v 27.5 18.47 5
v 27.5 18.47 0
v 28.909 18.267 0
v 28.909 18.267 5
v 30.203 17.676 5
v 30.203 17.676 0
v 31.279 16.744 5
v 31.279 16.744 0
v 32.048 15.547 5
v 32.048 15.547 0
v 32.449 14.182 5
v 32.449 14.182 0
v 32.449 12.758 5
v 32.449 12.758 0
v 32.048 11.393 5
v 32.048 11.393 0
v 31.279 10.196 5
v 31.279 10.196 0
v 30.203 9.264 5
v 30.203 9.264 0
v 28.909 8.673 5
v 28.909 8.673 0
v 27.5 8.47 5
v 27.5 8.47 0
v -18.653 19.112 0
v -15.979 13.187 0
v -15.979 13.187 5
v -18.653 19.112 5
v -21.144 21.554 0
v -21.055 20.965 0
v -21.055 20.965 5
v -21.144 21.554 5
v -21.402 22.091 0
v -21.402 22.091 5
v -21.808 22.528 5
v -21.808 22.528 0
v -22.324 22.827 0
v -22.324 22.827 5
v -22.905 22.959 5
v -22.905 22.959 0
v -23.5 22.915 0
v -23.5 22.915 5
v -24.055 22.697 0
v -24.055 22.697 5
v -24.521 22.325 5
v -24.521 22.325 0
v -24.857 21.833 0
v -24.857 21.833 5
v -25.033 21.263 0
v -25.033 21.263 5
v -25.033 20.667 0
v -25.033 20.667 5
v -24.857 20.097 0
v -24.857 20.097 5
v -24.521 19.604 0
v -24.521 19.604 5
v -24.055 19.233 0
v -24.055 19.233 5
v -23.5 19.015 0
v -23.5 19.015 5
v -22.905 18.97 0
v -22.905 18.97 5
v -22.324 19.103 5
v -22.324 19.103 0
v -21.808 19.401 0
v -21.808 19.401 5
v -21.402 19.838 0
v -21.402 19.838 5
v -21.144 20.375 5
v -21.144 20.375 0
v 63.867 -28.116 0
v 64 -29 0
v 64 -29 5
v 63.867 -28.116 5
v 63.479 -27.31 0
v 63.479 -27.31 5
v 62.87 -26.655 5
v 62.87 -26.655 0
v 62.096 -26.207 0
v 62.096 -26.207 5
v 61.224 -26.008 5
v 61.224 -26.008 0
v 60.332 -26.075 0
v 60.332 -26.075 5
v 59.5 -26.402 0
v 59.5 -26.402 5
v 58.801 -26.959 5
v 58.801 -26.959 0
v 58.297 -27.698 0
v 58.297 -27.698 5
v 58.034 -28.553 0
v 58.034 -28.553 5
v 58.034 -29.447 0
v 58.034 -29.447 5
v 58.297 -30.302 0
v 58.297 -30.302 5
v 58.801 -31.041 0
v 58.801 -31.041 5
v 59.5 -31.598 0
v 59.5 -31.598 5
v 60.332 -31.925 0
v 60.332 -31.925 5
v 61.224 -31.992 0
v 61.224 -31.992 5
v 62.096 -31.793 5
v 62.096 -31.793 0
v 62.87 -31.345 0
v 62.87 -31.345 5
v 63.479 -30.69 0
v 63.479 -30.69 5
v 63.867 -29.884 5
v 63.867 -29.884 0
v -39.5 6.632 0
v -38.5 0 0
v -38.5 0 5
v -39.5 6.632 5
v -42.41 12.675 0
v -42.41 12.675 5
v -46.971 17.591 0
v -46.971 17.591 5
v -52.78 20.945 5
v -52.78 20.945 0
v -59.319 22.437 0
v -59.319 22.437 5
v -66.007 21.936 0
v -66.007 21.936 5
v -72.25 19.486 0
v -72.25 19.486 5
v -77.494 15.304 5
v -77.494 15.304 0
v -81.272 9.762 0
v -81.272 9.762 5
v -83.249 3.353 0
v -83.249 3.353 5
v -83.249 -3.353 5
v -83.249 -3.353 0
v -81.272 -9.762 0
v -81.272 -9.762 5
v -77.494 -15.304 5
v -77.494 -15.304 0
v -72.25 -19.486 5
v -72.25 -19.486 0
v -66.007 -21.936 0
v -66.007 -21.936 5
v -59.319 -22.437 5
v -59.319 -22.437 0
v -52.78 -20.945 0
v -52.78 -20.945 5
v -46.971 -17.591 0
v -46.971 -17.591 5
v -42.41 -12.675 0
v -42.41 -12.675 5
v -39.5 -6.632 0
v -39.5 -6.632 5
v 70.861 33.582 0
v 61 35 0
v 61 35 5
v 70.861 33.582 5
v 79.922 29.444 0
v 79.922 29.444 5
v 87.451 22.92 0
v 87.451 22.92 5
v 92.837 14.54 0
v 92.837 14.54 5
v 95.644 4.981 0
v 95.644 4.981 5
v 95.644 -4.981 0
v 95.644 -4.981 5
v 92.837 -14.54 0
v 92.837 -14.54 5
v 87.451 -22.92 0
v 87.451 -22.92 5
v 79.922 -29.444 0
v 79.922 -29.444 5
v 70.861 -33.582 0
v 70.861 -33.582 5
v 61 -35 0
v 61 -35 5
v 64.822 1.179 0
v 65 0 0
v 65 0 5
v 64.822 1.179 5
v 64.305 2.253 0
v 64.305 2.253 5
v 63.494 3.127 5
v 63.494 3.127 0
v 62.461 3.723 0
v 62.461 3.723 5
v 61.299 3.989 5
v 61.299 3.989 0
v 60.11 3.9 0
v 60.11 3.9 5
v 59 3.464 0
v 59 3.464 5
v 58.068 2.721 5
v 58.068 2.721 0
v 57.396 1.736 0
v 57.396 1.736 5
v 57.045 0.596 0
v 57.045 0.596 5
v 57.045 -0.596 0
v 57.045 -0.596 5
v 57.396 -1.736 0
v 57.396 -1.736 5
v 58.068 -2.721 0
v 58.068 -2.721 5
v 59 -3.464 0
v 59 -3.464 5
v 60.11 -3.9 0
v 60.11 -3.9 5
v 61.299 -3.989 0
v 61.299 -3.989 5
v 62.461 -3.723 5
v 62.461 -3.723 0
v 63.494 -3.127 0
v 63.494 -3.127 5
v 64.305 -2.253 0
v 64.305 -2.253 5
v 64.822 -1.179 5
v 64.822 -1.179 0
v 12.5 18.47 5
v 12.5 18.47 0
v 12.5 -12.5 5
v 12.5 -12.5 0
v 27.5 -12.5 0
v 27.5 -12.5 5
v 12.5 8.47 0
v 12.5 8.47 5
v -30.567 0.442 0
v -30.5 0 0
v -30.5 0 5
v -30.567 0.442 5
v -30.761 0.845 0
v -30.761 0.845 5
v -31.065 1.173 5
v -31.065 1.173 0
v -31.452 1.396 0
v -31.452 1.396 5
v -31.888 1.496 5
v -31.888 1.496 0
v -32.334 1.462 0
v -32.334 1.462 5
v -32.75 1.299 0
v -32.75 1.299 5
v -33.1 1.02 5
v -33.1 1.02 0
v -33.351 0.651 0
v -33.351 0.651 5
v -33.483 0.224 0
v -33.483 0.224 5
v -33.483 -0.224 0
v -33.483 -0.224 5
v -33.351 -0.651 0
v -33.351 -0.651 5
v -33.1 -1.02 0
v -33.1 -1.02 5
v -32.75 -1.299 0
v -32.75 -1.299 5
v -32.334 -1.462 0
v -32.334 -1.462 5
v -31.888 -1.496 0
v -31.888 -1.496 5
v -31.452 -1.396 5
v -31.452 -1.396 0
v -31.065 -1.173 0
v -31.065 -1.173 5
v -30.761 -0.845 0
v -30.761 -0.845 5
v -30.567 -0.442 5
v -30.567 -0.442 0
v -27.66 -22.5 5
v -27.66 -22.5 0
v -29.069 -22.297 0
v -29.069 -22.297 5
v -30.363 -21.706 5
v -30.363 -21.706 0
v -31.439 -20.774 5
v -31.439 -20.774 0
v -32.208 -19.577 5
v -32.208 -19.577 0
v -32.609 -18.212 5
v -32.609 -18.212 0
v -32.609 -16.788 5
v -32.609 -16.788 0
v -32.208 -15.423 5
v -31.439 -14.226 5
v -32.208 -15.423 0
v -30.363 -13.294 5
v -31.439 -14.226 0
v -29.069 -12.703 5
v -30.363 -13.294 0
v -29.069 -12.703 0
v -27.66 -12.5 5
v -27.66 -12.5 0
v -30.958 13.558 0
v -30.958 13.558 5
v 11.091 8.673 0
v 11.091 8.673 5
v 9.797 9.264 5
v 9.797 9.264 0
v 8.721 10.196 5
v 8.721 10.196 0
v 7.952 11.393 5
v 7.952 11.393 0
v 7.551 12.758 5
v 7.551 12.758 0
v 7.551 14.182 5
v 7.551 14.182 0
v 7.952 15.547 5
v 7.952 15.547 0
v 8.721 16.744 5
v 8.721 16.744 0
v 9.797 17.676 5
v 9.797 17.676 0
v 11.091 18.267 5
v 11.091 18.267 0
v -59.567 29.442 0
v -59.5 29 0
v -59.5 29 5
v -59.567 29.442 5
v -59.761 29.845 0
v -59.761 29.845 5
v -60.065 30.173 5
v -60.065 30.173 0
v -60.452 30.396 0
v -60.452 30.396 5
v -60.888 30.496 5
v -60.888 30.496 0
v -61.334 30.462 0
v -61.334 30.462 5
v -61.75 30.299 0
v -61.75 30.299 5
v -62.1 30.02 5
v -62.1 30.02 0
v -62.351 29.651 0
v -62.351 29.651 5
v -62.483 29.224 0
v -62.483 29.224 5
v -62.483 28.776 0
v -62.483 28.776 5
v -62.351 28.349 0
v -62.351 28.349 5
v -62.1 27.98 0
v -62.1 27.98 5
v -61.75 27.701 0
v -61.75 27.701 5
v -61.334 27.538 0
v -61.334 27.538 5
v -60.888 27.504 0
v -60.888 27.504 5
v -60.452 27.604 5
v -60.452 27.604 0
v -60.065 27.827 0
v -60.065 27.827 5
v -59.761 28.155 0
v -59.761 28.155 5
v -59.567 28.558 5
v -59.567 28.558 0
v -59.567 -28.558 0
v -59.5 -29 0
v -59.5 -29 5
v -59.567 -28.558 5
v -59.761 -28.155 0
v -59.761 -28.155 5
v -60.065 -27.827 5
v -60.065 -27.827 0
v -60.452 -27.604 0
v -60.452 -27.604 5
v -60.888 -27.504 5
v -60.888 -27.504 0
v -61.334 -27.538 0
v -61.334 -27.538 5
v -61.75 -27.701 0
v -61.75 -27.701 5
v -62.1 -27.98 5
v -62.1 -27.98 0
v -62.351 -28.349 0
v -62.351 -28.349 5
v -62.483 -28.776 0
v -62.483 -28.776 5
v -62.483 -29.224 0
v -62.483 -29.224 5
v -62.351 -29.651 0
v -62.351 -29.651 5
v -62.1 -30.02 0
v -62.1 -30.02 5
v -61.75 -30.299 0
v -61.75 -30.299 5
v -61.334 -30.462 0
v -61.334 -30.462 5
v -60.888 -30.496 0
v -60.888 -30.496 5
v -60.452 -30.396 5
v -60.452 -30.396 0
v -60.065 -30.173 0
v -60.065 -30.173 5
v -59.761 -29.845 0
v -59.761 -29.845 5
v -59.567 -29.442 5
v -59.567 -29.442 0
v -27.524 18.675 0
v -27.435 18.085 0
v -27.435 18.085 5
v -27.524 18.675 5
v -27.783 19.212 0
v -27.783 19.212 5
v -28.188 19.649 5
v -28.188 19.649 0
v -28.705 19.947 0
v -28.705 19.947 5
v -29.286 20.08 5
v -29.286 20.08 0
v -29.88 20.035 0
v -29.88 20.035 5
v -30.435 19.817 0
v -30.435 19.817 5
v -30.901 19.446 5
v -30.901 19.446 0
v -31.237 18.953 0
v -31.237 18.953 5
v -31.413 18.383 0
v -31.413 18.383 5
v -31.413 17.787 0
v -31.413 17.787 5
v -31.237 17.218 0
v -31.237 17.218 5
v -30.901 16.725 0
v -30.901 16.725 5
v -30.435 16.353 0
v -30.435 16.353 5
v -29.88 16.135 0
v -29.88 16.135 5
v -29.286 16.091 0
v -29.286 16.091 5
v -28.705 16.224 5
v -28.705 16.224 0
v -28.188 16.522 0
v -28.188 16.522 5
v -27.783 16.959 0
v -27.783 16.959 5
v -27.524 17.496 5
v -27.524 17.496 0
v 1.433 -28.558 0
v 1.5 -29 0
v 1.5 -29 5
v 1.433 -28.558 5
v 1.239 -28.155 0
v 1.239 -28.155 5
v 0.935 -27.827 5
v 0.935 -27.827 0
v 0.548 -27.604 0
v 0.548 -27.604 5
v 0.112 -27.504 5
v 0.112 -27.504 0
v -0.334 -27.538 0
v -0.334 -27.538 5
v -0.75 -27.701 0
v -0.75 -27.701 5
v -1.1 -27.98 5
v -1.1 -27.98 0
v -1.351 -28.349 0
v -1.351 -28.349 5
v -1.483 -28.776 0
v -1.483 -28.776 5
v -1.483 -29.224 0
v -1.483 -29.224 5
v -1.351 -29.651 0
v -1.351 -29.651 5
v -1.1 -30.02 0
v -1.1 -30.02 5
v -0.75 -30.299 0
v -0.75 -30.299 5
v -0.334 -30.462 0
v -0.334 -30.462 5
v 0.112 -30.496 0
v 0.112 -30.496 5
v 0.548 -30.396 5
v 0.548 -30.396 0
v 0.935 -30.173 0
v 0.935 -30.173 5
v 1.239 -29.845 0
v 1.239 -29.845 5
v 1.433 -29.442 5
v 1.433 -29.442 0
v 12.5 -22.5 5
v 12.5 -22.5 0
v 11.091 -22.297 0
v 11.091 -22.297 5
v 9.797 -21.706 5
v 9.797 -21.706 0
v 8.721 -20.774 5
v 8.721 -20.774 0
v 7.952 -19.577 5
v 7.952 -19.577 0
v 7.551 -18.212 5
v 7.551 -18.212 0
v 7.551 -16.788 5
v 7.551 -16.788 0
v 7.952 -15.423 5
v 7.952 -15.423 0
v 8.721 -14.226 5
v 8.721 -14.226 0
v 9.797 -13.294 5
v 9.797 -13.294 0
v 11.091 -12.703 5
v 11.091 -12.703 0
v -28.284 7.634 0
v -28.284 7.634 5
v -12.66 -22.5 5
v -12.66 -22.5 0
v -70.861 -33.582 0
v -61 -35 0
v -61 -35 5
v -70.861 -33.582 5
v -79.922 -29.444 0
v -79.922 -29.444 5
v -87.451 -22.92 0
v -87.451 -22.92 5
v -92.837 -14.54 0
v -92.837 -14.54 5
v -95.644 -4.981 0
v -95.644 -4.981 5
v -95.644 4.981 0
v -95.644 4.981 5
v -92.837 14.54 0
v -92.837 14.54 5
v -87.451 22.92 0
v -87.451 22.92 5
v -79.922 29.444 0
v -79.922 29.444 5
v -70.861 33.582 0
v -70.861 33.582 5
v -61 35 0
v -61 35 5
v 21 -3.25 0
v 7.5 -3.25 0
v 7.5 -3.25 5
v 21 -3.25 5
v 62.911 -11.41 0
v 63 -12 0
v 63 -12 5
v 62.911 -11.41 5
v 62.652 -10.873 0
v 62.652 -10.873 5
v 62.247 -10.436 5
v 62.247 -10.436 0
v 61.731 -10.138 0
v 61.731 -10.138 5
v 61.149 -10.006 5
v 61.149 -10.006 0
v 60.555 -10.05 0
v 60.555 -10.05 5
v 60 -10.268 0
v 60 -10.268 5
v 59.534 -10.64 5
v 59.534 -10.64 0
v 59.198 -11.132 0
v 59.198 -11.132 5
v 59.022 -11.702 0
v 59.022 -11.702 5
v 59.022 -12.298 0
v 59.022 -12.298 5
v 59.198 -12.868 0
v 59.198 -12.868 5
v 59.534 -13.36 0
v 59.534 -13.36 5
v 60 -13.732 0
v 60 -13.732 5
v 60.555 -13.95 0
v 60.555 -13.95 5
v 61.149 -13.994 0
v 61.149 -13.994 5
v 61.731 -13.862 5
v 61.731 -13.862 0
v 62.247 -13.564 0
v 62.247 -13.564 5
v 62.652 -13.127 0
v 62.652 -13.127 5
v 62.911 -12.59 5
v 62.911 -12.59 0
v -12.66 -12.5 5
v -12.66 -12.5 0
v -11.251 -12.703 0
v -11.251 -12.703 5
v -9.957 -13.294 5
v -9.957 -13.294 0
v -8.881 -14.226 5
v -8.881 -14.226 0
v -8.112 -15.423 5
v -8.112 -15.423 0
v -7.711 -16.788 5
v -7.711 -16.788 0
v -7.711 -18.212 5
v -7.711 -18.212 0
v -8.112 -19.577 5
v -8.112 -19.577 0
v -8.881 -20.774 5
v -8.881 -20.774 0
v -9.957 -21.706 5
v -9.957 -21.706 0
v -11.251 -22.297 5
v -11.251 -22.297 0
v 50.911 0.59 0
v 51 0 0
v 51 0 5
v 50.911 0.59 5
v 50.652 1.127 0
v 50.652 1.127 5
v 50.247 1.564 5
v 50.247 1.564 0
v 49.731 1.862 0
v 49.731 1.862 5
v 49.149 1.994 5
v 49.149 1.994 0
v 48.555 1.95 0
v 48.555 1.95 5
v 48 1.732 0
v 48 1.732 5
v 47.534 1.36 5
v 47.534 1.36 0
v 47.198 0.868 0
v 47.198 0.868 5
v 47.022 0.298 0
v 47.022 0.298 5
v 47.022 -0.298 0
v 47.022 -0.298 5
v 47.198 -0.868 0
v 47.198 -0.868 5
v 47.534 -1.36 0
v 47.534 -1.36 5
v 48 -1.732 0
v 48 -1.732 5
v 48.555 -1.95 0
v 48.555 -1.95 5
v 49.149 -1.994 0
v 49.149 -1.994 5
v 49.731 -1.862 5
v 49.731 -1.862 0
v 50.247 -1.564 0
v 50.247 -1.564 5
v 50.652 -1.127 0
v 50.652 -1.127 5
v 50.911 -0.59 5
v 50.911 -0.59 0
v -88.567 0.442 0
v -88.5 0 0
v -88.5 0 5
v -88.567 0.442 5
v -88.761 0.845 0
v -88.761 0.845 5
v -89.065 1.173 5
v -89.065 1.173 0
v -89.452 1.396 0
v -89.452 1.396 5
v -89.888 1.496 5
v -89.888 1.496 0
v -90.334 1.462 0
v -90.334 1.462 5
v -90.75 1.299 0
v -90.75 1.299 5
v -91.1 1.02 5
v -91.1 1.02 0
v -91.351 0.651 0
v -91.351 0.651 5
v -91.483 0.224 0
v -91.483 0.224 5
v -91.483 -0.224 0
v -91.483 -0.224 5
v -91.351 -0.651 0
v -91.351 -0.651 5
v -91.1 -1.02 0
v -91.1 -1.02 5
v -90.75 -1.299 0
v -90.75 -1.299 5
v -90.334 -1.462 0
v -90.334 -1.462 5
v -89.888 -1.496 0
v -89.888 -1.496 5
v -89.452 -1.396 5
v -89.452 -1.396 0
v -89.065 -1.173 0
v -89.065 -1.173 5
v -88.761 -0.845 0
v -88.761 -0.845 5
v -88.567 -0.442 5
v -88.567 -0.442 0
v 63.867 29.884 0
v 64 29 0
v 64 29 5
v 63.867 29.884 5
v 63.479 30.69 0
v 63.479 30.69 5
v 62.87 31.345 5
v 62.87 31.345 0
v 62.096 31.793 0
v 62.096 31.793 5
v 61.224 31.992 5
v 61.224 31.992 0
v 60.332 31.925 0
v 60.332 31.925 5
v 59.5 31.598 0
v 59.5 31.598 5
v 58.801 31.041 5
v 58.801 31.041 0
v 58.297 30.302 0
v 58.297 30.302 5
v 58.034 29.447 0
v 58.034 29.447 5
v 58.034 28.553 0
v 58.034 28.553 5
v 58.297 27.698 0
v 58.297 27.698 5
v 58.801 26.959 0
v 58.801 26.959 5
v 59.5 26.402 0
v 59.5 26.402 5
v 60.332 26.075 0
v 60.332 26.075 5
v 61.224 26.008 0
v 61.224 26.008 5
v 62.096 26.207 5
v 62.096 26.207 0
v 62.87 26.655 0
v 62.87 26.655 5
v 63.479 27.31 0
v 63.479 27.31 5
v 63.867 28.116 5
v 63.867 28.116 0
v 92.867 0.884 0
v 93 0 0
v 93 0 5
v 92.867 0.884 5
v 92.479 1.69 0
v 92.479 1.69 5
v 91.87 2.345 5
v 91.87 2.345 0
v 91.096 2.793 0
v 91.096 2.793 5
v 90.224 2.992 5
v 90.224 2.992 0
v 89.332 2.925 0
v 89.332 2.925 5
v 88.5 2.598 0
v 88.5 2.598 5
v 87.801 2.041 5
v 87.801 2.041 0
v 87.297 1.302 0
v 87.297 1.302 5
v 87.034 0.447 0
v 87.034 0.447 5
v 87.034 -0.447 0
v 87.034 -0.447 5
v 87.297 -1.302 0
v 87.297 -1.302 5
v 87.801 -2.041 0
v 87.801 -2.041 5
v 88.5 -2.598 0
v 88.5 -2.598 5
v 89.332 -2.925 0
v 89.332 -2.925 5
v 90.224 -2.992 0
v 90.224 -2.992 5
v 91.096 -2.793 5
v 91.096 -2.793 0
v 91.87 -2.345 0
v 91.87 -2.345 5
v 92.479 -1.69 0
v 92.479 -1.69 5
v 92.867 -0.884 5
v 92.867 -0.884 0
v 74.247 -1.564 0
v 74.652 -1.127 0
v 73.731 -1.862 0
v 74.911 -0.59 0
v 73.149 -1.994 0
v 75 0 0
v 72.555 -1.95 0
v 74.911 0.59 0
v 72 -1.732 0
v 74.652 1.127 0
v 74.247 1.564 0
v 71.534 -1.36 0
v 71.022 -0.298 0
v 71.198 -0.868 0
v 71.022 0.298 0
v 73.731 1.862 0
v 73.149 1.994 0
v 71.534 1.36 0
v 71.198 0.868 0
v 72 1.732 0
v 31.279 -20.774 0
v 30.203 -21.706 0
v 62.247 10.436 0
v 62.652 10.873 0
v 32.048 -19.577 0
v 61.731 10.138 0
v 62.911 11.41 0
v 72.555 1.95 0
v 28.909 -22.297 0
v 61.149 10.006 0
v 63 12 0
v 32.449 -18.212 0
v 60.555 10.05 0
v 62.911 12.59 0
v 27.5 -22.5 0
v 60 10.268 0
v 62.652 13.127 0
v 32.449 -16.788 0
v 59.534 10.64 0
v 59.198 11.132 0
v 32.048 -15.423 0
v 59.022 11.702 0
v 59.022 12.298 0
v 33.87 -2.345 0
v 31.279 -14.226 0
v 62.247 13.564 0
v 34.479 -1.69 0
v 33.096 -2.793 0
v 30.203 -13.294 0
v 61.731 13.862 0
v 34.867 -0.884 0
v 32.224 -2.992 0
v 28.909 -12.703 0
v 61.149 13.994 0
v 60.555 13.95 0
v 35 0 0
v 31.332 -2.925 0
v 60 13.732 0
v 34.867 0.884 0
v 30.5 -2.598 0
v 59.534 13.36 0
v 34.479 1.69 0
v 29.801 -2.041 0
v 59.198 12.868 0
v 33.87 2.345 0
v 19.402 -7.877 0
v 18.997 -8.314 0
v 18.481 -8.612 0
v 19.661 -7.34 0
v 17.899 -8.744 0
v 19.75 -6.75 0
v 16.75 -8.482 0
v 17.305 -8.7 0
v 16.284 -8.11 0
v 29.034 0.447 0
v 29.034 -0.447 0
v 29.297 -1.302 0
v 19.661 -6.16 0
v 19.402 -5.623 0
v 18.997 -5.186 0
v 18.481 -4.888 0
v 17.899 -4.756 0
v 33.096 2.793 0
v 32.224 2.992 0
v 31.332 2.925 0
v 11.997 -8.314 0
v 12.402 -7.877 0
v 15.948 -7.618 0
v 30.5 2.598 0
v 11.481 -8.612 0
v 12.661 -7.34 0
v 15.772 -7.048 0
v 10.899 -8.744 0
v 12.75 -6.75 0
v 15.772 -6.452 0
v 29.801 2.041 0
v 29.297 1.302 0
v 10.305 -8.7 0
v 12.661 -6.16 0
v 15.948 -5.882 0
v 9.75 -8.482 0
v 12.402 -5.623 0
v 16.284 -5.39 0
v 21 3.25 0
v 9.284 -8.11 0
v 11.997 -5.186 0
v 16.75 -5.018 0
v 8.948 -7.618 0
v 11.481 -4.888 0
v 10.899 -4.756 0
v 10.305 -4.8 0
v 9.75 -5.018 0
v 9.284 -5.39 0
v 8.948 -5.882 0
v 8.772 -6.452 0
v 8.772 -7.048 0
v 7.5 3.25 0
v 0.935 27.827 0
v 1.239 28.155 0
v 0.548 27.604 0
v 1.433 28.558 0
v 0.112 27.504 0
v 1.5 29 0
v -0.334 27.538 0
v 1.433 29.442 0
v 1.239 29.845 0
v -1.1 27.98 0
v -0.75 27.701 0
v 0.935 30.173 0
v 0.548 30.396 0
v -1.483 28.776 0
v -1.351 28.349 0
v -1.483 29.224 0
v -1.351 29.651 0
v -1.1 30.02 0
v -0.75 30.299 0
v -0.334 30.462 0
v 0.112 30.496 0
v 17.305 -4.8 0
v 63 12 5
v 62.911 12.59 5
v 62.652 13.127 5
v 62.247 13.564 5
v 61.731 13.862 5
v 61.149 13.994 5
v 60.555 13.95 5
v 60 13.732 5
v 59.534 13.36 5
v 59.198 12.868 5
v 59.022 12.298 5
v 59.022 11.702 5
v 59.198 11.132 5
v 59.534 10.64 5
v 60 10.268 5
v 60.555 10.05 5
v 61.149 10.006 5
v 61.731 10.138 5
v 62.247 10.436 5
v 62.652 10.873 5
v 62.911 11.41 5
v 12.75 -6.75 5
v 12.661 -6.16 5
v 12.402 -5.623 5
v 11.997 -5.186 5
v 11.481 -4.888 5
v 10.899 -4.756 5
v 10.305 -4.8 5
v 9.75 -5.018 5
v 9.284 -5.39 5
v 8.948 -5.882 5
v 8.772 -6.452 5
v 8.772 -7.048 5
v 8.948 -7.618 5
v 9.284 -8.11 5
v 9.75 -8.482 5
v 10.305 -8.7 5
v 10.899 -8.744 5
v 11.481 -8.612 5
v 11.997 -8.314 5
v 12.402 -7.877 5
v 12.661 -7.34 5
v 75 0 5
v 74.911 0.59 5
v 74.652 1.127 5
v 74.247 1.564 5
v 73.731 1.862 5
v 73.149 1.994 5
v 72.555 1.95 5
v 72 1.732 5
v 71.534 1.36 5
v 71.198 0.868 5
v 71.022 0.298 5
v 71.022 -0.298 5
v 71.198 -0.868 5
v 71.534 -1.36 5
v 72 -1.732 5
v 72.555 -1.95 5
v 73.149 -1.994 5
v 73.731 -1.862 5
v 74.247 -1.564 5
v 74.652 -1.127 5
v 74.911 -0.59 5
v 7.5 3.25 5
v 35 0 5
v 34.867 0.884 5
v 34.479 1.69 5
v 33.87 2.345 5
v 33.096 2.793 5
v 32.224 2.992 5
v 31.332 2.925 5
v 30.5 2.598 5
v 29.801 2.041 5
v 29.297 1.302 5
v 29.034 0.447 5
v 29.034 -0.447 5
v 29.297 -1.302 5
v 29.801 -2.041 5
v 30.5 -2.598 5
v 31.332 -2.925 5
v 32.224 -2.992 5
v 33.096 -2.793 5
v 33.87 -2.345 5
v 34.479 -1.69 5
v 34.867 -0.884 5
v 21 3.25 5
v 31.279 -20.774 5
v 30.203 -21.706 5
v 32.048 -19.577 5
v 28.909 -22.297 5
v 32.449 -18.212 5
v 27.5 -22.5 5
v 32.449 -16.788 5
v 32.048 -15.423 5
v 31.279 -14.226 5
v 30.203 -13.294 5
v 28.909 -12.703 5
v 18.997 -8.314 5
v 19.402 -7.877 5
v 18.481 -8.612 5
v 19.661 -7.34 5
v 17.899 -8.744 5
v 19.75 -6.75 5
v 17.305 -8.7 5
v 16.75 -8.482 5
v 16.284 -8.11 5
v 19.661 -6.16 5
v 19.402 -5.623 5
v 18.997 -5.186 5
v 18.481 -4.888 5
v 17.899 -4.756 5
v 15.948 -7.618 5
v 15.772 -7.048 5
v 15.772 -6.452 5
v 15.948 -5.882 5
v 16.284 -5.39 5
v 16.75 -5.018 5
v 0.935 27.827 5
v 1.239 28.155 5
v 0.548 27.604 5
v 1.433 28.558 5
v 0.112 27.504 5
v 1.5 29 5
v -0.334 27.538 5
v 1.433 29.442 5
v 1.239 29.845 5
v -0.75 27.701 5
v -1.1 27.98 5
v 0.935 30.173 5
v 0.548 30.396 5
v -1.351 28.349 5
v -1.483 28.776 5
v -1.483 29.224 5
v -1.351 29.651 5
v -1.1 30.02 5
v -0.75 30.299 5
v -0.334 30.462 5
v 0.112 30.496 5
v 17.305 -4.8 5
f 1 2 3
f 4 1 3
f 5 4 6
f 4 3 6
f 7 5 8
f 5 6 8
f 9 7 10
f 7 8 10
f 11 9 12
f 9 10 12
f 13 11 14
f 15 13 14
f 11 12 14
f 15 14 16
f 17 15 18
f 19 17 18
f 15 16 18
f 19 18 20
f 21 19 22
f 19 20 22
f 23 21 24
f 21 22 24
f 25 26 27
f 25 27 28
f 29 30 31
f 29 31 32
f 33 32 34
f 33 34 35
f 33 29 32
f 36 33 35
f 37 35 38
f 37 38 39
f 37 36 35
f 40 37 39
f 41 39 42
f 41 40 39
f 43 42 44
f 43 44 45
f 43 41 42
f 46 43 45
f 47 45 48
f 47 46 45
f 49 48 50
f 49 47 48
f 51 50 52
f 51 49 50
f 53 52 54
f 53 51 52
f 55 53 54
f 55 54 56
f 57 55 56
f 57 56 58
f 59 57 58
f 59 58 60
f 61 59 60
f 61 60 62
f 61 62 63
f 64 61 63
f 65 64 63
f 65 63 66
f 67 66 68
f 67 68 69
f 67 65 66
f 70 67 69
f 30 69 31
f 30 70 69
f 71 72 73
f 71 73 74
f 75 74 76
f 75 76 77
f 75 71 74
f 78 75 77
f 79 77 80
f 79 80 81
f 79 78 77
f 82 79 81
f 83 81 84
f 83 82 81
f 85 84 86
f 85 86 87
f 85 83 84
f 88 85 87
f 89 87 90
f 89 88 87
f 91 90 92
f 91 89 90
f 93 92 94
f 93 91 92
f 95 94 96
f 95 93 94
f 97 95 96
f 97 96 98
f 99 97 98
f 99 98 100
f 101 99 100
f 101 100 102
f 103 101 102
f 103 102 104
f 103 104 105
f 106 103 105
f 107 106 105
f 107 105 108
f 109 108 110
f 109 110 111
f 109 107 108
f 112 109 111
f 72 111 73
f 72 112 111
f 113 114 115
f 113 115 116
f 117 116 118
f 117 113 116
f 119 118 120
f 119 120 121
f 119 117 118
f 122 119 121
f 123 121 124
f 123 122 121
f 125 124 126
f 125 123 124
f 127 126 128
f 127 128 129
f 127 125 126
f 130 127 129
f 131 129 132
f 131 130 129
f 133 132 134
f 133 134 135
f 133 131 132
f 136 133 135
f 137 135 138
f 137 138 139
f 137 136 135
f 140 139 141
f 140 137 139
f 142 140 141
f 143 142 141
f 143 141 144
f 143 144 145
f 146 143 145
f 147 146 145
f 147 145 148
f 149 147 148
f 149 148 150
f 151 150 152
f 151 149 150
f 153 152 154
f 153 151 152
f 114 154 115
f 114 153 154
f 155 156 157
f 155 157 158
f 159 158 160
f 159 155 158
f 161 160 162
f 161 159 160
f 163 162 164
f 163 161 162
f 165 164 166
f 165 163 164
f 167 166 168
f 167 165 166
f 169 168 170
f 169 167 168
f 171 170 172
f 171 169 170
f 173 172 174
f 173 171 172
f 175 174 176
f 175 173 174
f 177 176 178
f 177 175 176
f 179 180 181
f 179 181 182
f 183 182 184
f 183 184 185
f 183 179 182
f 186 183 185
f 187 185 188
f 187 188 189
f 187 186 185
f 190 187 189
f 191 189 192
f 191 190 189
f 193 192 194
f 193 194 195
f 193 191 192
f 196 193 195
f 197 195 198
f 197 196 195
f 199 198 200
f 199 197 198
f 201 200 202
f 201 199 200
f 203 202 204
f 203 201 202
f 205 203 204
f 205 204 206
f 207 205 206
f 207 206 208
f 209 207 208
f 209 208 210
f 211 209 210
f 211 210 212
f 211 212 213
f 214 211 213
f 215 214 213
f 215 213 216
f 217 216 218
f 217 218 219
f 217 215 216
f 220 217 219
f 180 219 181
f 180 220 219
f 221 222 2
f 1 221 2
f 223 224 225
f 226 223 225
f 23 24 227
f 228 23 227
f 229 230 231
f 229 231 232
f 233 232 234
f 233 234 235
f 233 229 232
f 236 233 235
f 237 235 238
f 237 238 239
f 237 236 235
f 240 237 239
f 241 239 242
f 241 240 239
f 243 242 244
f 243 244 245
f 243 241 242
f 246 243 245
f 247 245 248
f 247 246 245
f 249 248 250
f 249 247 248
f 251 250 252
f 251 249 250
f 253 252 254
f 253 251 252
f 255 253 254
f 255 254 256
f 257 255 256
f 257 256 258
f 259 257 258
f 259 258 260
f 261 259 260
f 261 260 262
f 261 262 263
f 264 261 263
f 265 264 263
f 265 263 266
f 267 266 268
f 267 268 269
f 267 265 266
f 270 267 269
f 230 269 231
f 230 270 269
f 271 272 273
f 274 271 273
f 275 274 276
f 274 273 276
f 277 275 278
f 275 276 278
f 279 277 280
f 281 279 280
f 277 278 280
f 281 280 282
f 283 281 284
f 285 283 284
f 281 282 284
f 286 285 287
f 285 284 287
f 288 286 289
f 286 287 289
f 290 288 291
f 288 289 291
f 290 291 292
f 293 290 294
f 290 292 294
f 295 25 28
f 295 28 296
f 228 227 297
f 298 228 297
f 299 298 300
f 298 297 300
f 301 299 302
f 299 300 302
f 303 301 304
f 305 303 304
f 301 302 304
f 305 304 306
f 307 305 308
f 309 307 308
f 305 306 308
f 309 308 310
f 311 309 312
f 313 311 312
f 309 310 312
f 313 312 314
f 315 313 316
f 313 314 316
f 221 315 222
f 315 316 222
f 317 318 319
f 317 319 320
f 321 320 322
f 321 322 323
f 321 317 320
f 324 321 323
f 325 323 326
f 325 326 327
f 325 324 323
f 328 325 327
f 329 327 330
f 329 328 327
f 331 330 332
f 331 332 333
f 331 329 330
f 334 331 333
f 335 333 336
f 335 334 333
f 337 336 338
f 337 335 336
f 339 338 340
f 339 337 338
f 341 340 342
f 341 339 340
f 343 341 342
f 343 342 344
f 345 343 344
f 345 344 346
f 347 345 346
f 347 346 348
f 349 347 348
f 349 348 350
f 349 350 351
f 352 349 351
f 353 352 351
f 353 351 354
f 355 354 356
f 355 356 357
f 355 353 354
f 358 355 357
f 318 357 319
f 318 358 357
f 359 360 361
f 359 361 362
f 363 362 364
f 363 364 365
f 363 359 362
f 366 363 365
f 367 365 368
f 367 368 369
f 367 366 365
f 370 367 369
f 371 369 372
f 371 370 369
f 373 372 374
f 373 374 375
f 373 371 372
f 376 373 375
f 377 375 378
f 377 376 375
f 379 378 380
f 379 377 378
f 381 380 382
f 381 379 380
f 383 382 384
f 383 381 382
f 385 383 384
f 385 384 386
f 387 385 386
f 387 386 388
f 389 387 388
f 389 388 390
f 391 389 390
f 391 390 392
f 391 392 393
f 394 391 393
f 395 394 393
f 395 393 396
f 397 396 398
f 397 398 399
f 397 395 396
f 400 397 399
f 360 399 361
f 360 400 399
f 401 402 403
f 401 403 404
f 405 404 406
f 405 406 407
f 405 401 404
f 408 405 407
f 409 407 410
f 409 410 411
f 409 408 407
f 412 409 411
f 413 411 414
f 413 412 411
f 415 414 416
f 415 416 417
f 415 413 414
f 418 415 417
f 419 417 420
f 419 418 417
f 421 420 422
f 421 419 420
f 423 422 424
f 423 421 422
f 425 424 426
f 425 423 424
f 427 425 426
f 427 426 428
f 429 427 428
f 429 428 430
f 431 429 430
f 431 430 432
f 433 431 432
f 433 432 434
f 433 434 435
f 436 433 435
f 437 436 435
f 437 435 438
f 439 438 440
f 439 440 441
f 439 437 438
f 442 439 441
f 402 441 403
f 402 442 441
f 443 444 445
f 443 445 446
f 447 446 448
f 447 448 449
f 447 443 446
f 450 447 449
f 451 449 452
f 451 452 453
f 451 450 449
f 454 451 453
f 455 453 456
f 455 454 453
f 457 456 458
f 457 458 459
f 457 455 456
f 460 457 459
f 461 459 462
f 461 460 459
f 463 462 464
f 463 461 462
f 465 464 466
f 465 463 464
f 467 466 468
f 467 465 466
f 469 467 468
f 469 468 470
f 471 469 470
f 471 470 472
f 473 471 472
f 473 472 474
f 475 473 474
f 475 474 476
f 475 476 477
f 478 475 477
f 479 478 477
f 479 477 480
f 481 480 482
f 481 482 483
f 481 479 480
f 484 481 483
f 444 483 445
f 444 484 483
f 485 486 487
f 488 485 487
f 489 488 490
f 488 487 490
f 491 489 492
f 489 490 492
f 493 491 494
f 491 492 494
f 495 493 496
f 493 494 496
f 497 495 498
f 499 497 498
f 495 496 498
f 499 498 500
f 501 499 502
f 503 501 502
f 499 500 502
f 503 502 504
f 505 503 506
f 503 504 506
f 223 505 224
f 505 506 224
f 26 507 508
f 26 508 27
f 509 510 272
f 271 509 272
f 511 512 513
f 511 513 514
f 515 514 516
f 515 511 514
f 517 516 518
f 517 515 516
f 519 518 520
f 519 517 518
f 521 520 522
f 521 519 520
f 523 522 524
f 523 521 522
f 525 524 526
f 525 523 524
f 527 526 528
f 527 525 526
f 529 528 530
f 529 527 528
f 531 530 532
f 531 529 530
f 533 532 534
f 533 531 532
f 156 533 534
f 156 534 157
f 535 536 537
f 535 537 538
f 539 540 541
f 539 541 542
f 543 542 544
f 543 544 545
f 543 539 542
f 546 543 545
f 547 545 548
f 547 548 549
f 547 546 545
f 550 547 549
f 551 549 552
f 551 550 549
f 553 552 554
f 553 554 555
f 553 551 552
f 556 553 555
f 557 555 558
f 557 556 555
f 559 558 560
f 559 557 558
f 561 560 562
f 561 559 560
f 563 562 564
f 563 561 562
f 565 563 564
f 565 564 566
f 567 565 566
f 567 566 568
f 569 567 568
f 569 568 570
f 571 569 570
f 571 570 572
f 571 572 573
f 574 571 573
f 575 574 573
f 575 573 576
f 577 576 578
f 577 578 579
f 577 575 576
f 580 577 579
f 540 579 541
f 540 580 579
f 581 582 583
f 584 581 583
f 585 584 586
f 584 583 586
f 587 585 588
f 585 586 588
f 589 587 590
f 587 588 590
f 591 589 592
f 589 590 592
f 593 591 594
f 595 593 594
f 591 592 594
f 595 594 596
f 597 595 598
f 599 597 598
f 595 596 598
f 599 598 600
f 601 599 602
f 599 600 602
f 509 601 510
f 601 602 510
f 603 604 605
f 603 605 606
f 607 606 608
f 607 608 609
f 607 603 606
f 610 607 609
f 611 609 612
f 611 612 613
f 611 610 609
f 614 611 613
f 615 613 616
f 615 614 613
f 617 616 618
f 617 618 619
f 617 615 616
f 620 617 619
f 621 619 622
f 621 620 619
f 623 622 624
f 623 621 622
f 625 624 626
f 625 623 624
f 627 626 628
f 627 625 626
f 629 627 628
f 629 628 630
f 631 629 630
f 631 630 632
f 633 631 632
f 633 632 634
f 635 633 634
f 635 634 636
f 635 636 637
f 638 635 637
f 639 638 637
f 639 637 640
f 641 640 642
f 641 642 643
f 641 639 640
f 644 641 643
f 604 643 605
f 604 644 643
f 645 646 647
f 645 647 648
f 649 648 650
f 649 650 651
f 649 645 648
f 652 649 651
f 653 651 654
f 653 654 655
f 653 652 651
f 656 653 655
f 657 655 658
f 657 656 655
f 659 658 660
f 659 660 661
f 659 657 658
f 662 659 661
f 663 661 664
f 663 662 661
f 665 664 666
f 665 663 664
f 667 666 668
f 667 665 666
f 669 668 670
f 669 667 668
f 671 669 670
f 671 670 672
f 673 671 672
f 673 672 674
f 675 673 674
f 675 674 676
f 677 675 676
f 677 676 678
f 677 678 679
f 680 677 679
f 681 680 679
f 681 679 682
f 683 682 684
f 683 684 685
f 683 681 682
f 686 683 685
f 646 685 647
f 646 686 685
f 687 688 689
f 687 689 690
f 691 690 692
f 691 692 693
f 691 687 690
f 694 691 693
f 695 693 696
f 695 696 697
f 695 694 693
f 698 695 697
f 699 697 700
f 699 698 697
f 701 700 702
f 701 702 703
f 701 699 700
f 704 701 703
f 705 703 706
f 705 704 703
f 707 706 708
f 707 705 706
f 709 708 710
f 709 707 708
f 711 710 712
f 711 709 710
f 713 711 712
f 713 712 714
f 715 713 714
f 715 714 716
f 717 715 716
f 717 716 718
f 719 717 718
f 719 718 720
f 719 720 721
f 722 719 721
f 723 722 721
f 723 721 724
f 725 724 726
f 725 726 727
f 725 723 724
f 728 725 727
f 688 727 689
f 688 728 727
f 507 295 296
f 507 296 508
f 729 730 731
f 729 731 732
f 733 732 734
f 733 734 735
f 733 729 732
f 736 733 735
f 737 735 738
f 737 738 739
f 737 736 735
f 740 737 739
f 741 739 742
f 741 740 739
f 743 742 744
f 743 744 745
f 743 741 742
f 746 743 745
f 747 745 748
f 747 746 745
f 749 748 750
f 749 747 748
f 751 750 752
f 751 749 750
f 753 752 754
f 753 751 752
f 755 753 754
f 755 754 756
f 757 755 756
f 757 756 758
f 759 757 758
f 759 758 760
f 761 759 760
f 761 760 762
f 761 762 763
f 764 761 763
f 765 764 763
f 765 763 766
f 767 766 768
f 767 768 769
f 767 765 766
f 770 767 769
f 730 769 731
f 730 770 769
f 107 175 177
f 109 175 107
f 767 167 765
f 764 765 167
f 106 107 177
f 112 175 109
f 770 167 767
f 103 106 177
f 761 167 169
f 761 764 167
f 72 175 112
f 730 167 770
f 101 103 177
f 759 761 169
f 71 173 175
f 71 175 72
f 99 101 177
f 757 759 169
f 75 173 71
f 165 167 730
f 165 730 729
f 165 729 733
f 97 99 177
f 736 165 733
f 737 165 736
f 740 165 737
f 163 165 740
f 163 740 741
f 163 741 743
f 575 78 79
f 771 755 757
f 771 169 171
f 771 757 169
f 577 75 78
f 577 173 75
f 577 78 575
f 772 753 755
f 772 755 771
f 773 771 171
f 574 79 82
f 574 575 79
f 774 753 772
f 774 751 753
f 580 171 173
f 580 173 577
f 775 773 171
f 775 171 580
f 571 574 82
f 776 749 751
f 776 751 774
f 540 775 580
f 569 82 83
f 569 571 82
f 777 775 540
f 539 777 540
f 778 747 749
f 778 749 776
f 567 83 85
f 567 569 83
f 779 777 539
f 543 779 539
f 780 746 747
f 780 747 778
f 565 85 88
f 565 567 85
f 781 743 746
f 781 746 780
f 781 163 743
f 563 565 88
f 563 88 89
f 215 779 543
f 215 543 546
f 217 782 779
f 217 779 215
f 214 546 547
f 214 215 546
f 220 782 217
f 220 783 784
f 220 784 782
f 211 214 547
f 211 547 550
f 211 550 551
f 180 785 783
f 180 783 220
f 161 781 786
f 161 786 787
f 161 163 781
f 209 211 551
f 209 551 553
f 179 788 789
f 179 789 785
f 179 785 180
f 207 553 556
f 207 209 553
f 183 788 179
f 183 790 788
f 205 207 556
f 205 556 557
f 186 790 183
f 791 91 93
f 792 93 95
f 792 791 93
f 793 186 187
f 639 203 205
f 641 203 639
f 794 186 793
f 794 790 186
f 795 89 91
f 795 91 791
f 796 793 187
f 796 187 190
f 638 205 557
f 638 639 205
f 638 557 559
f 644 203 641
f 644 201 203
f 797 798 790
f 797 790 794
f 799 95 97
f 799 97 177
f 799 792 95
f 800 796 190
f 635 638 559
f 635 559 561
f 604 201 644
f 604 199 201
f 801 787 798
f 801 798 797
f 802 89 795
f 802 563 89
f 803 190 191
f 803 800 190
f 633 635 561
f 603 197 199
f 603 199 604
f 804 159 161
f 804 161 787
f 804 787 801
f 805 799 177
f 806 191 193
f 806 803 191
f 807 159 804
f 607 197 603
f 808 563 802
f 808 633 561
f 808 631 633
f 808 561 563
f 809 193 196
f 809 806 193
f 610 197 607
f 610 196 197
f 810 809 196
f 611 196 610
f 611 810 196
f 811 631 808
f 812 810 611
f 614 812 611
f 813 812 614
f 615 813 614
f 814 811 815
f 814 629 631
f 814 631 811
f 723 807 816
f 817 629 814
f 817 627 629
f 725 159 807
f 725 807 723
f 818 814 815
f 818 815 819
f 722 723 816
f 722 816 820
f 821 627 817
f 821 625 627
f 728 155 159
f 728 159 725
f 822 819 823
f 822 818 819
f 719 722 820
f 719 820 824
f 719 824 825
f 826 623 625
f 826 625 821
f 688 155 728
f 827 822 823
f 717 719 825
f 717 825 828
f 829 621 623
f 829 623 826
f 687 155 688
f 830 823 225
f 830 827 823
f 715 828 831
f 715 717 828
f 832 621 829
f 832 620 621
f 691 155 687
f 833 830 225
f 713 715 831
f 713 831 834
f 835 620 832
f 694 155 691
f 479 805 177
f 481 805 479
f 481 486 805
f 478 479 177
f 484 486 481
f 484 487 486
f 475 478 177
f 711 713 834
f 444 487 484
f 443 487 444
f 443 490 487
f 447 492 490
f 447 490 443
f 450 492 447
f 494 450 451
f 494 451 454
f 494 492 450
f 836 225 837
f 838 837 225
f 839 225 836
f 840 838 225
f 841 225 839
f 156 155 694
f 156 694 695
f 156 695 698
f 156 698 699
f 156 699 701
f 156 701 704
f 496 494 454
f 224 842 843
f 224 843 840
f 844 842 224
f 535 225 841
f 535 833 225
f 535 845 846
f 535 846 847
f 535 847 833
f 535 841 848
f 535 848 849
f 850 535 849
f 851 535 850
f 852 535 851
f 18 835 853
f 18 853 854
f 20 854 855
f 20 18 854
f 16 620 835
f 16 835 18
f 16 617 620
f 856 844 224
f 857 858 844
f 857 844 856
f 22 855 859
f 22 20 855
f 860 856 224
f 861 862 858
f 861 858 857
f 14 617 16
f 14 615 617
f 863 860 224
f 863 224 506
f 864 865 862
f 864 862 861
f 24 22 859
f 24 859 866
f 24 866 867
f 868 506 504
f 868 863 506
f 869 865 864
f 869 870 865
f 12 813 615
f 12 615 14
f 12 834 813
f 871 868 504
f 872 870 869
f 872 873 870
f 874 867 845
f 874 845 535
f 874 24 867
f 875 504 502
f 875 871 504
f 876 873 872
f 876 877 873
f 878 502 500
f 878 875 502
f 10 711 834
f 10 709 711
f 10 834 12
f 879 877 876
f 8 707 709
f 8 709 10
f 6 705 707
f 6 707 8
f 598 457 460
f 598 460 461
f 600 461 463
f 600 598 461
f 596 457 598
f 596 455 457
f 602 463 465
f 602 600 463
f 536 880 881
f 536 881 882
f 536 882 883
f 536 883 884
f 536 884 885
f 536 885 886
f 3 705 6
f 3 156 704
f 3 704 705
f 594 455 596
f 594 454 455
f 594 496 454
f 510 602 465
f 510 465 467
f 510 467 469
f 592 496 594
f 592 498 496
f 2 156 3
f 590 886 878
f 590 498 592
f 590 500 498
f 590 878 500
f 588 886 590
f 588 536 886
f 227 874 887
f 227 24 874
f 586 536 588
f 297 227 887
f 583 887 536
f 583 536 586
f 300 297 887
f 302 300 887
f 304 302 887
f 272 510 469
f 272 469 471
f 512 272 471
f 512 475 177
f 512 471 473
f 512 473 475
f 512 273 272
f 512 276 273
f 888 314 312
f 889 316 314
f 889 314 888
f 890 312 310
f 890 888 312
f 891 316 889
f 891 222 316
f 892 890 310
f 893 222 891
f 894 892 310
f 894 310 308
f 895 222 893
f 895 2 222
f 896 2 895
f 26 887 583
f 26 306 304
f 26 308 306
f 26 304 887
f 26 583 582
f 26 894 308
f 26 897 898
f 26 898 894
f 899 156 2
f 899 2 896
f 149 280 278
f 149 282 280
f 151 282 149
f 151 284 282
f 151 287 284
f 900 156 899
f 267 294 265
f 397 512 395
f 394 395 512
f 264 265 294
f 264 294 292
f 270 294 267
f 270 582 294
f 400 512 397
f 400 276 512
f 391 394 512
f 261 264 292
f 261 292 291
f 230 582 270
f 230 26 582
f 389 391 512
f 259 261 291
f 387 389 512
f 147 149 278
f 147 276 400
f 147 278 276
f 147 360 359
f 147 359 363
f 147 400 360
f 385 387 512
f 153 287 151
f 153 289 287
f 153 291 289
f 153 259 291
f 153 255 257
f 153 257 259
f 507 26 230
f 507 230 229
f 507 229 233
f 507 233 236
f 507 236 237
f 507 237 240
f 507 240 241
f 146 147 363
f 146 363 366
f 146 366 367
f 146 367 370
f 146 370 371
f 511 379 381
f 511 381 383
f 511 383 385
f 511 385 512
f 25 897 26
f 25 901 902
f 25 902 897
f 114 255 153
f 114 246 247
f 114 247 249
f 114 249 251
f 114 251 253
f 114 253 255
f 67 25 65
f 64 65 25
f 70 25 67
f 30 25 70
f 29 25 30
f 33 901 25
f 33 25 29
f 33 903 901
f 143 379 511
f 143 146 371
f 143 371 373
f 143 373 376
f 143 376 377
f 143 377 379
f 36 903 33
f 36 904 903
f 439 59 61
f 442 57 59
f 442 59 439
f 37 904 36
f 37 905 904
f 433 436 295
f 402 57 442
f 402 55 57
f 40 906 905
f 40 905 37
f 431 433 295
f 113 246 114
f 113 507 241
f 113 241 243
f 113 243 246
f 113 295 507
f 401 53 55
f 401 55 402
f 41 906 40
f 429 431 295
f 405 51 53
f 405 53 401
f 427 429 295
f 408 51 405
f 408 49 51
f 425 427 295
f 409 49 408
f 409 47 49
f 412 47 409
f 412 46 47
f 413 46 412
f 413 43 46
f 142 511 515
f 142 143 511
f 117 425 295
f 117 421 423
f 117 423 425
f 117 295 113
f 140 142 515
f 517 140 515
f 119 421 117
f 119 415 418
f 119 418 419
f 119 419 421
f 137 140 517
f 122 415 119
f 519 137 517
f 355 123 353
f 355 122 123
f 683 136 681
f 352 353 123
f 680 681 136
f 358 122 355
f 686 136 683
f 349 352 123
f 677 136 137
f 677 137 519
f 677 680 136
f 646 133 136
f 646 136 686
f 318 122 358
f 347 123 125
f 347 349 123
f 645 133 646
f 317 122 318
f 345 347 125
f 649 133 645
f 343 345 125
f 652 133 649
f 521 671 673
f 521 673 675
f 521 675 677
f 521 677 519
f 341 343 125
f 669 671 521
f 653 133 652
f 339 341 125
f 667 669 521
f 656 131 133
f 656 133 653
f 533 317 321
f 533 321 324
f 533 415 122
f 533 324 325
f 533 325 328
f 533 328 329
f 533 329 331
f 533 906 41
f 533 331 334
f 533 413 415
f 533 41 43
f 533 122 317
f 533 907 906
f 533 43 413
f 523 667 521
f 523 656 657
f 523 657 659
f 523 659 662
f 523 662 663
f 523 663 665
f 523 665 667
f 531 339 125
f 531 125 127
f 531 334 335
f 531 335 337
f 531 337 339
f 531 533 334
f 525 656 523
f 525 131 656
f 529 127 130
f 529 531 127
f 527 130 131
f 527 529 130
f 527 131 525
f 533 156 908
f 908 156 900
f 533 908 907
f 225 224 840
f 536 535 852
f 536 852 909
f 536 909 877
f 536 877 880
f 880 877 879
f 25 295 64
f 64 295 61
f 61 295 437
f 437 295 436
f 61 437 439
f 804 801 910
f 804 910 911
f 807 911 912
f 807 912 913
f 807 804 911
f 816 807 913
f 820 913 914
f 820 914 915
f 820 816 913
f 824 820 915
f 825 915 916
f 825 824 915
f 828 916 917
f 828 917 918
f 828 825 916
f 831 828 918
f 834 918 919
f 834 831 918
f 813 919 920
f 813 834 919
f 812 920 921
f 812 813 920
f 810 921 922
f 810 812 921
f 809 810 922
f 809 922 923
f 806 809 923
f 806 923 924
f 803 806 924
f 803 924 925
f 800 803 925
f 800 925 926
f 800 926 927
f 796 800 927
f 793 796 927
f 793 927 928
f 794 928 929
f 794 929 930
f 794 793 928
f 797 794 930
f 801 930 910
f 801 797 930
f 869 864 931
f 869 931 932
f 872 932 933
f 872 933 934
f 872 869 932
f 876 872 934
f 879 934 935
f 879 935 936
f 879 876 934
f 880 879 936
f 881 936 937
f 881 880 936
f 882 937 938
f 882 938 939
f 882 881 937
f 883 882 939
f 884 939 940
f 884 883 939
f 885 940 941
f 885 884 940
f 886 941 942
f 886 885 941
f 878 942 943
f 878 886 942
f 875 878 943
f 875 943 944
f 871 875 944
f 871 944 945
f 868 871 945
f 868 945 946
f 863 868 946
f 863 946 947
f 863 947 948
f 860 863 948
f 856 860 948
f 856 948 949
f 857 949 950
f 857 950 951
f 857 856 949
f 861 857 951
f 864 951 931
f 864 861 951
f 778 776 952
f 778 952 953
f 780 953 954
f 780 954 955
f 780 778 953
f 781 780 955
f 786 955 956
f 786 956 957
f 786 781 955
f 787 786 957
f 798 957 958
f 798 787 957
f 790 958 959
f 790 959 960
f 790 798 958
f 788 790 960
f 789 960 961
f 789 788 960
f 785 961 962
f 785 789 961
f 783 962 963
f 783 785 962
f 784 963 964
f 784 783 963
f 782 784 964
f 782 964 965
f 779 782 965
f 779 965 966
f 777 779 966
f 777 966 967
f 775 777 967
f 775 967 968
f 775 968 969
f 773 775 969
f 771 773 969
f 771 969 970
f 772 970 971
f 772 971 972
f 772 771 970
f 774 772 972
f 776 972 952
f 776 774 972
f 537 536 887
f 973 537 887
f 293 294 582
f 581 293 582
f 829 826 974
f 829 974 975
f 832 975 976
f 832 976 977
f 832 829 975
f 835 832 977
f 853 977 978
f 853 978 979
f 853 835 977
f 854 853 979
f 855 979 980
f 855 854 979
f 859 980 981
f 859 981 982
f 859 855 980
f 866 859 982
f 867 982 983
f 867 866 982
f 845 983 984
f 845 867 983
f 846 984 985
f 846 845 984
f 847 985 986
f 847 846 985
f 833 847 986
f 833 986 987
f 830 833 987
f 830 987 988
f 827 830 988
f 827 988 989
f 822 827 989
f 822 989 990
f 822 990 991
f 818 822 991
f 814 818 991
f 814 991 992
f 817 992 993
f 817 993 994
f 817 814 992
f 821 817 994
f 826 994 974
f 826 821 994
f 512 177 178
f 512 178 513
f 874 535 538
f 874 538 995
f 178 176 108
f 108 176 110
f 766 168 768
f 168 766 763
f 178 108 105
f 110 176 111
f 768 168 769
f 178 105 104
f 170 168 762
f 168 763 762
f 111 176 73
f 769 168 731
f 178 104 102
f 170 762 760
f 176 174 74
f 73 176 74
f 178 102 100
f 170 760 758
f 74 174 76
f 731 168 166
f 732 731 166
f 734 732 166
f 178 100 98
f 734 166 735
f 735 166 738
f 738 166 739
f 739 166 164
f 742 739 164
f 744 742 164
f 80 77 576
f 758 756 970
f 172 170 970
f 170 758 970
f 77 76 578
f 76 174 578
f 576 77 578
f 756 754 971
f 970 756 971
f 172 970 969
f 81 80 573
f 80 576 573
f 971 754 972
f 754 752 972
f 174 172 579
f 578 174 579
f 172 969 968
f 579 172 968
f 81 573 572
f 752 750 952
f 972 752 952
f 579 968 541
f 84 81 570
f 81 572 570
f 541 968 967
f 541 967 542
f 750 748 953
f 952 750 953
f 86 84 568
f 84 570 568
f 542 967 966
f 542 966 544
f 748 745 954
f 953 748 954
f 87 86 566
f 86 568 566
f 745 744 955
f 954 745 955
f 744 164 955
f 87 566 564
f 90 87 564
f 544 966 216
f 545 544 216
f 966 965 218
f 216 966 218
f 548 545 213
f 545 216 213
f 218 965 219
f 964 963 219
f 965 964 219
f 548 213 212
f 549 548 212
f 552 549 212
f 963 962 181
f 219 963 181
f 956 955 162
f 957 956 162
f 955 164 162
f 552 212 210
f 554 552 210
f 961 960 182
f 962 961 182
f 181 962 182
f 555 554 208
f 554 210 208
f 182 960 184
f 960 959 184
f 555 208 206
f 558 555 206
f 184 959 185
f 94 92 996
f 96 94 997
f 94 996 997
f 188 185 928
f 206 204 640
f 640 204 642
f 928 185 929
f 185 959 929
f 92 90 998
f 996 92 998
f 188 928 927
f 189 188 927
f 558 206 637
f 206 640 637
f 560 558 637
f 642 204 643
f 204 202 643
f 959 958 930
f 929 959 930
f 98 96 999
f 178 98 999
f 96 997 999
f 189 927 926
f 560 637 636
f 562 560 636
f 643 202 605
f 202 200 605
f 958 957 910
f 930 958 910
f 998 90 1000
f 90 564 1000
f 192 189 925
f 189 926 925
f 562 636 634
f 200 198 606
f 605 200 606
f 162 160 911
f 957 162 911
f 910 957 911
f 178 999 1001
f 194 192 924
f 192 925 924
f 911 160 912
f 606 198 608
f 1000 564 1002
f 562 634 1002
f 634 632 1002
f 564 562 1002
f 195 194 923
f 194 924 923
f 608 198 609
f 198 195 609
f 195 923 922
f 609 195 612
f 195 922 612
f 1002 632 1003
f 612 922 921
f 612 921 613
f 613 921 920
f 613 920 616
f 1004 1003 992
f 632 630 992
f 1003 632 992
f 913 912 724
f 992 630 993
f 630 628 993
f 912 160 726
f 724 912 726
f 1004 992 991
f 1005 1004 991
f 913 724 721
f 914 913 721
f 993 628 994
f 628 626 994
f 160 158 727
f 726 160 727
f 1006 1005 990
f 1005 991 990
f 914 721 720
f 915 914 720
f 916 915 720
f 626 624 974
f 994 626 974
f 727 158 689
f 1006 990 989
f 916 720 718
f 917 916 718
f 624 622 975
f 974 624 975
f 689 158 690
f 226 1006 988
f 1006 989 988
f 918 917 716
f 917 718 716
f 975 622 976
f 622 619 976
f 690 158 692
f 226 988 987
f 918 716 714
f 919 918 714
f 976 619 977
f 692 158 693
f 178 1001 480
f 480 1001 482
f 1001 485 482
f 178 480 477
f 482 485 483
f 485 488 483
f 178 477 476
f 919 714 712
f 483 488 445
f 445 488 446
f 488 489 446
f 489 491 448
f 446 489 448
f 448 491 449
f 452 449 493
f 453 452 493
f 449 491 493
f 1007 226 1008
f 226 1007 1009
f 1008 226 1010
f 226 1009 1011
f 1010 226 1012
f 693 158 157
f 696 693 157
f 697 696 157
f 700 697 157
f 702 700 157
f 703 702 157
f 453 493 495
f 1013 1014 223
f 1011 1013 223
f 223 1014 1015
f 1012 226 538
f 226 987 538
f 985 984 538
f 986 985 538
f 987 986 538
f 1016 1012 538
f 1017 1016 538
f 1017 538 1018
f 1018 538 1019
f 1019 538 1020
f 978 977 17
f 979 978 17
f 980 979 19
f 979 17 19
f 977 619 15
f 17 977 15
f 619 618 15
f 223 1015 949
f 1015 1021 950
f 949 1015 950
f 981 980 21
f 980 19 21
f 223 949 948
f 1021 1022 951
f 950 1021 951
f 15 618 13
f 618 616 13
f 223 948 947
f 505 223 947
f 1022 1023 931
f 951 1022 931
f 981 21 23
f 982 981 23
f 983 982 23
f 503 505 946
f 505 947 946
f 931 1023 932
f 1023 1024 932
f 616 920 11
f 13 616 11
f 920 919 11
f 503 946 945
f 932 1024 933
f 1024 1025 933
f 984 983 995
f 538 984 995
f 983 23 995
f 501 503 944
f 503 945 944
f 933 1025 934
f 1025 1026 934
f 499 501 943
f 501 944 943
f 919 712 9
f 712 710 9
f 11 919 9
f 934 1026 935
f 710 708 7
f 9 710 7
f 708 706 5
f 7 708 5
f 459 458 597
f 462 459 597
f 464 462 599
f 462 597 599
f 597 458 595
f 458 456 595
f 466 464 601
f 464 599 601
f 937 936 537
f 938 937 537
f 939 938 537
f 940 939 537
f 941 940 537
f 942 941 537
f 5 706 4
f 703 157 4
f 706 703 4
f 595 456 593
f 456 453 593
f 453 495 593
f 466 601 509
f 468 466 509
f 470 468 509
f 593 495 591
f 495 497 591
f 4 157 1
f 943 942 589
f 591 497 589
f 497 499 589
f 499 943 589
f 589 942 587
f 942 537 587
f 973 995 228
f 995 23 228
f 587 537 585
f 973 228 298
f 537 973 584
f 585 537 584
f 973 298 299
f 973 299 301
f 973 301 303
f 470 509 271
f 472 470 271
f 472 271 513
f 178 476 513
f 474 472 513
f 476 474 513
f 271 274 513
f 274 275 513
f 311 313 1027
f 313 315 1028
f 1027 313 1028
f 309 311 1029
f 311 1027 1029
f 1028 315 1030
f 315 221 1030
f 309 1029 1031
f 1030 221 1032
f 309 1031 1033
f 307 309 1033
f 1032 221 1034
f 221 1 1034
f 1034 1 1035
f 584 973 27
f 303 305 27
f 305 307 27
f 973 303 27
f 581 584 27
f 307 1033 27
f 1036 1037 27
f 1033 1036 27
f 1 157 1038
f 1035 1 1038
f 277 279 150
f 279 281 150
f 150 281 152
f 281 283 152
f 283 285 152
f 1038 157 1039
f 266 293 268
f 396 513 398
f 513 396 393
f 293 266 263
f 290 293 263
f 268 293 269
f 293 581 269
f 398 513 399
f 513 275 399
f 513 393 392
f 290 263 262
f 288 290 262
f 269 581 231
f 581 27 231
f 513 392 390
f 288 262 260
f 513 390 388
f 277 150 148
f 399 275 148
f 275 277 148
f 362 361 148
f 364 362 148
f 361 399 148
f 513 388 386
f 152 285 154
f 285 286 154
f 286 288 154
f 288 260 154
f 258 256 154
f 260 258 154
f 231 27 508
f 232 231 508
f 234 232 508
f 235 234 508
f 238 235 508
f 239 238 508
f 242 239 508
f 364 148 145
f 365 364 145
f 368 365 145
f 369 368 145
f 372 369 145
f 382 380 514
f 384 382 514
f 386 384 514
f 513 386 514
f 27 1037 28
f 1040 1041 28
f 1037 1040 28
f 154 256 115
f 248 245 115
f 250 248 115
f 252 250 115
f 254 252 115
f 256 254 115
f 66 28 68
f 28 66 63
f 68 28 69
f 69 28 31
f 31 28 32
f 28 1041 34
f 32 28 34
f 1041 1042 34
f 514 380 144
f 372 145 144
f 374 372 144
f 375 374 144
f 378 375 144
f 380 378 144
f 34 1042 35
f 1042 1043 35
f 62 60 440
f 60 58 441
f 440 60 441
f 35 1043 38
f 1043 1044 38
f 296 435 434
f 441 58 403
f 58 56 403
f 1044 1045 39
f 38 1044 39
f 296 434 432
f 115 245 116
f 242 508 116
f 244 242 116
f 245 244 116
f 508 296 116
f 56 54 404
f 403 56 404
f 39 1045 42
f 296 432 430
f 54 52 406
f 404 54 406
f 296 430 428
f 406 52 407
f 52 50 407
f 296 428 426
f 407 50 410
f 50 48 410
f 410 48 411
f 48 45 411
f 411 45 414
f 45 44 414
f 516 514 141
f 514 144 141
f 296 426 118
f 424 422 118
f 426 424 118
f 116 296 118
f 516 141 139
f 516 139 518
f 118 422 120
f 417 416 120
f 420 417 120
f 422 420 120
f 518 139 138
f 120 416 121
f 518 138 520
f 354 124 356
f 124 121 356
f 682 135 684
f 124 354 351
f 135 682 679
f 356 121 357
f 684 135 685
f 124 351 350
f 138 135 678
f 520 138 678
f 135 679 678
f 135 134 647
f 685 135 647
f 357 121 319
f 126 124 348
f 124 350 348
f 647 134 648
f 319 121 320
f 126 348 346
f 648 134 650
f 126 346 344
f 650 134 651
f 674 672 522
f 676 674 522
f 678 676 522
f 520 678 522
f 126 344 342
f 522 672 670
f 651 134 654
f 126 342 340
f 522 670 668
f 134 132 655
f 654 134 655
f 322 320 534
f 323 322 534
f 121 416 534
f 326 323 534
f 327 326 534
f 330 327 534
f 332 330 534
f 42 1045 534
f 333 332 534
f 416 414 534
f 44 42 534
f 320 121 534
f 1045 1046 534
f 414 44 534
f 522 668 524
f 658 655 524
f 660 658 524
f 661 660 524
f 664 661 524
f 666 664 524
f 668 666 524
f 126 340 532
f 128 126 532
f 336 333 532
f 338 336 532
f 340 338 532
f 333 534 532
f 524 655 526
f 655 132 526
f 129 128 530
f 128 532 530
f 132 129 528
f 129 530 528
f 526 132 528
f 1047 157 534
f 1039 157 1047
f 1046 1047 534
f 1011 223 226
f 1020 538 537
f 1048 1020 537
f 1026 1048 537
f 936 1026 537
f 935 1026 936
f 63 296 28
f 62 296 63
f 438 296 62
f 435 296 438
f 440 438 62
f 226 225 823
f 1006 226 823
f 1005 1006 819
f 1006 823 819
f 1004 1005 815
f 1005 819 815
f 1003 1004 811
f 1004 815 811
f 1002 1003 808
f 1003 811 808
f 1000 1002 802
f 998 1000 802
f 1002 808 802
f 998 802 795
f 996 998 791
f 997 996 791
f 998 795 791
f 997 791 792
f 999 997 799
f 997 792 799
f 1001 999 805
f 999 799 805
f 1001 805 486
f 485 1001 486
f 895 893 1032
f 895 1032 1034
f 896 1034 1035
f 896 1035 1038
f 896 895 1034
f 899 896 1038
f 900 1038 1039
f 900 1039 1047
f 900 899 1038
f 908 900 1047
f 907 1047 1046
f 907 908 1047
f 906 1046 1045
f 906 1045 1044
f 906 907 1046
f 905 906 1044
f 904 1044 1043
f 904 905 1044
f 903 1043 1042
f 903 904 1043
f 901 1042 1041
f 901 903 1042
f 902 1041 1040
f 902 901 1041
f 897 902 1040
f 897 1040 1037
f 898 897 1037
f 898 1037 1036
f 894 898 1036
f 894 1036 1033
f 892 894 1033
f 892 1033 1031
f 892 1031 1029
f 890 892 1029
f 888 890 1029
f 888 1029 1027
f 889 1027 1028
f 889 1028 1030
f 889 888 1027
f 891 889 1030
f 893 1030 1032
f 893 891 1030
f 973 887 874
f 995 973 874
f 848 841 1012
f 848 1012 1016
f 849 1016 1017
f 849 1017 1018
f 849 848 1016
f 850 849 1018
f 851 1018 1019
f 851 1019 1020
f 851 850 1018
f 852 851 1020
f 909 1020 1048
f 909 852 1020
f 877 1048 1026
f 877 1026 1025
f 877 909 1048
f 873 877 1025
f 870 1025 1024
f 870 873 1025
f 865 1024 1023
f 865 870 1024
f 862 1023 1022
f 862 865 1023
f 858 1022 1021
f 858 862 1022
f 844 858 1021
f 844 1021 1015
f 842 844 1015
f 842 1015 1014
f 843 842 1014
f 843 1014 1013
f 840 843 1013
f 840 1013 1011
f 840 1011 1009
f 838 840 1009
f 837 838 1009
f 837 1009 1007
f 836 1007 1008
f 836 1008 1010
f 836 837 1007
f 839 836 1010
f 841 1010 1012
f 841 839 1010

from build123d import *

# Parameters (mm, degrees)
SKETCH1_R           = 4
SKETCH1_R_2         = 22.5
SKETCH1_R_3         = 1.5
SKETCH1_R_4         = 3
SKETCH1_R_5         = 2
SKETCH1_W           = 13.5
SKETCH1_H           = 6.5
BOSS_EXTRUDE1_DEPTH = 5


with BuildPart() as part:
    # Sketch1 → Boss-Extrude1 (new body)
    with BuildSketch(Plane.XY):
        with BuildLine():
            Line((61, -35), (-61, -35))
            ThreePointArc((-61, -35), (-96, 0), (-61, 35))
            Line((-61, 35), (61, 35))
            ThreePointArc((61, 35), (96, 0), (61, -35))
        make_face()
        with Locations((61, 0)):
            Circle(SKETCH1_R, mode=Mode.SUBTRACT)
        with Locations((-61, 0)):
            Circle(SKETCH1_R_2, mode=Mode.SUBTRACT)
        with Locations((-61, -29)):
            Circle(SKETCH1_R_3, mode=Mode.SUBTRACT)
        with Locations((-61, 29)):
            Circle(SKETCH1_R_3, mode=Mode.SUBTRACT)
        with Locations((61, 29)):
            Circle(SKETCH1_R_4, mode=Mode.SUBTRACT)
        with Locations((61, -29)):
            Circle(SKETCH1_R_4, mode=Mode.SUBTRACT)
        with Locations((0, -29)):
            Circle(SKETCH1_R_3, mode=Mode.SUBTRACT)
        with Locations((0, 29)):
            Circle(SKETCH1_R_3, mode=Mode.SUBTRACT)
        with Locations((-90, 0)):
            Circle(SKETCH1_R_3, mode=Mode.SUBTRACT)
        with Locations((-32, 0)):
            Circle(SKETCH1_R_3, mode=Mode.SUBTRACT)
        with Locations((90, 0)):
            Circle(SKETCH1_R_4, mode=Mode.SUBTRACT)
        with Locations((32, 0)):
            Circle(SKETCH1_R_4, mode=Mode.SUBTRACT)
        with Locations((61, 12)):
            Circle(SKETCH1_R_5, mode=Mode.SUBTRACT)
        with Locations((61, -12)):
            Circle(SKETCH1_R_5, mode=Mode.SUBTRACT)
        with Locations((49, 0)):
            Circle(SKETCH1_R_5, mode=Mode.SUBTRACT)
        with Locations((73, 0)):
            Circle(SKETCH1_R_5, mode=Mode.SUBTRACT)
        with Locations((10.75, -6.75)):
            Circle(SKETCH1_R_5, mode=Mode.SUBTRACT)
        with Locations((17.75, -6.75)):
            Circle(SKETCH1_R_5, mode=Mode.SUBTRACT)
        with Locations((-23.054905042, 20.964824554)):
            Circle(SKETCH1_R_5, mode=Mode.SUBTRACT)
        with Locations((-29.435230641, 18.085337577)):
            Circle(SKETCH1_R_5, mode=Mode.SUBTRACT)
        with Locations((14.25, 0)):
            Rectangle(SKETCH1_W, SKETCH1_H, mode=Mode.SUBTRACT)
        with BuildLine():
            Line((-27.66, -12.5), (-12.66, -12.5))
            ThreePointArc((-12.66, -12.5), (-7.66, -17.5), (-12.66, -22.5))
            Line((-12.66, -22.5), (-27.66, -22.5))
            ThreePointArc((-27.66, -22.5), (-32.66, -17.5), (-27.66, -12.5))
        make_face(mode=Mode.SUBTRACT)
        with BuildLine():
            Line((12.5, -12.5), (27.5, -12.5))
            ThreePointArc((27.5, -12.5), (32.5, -17.5), (27.5, -22.5))
            Line((27.5, -22.5), (12.5, -22.5))
            ThreePointArc((12.5, -22.5), (7.5, -17.5), (12.5, -12.5))
        make_face(mode=Mode.SUBTRACT)
        with BuildLine():
            Line((12.5, 18.47), (27.5, 18.47))
            ThreePointArc((27.5, 18.47), (32.5, 13.47), (27.5, 8.47))
            Line((27.5, 8.47), (12.5, 8.47))
            ThreePointArc((12.5, 8.47), (7.5, 13.47), (12.5, 18.47))
        make_face(mode=Mode.SUBTRACT)
        Polygon((-30.95778118, 13.55827011), (-28.283971844, 7.633682054), (-15.979058189, 13.186978367), (-18.652867525, 19.111566423), align=None, mode=Mode.SUBTRACT)
    extrude(amount=BOSS_EXTRUDE1_DEPTH)


solid = part.part
